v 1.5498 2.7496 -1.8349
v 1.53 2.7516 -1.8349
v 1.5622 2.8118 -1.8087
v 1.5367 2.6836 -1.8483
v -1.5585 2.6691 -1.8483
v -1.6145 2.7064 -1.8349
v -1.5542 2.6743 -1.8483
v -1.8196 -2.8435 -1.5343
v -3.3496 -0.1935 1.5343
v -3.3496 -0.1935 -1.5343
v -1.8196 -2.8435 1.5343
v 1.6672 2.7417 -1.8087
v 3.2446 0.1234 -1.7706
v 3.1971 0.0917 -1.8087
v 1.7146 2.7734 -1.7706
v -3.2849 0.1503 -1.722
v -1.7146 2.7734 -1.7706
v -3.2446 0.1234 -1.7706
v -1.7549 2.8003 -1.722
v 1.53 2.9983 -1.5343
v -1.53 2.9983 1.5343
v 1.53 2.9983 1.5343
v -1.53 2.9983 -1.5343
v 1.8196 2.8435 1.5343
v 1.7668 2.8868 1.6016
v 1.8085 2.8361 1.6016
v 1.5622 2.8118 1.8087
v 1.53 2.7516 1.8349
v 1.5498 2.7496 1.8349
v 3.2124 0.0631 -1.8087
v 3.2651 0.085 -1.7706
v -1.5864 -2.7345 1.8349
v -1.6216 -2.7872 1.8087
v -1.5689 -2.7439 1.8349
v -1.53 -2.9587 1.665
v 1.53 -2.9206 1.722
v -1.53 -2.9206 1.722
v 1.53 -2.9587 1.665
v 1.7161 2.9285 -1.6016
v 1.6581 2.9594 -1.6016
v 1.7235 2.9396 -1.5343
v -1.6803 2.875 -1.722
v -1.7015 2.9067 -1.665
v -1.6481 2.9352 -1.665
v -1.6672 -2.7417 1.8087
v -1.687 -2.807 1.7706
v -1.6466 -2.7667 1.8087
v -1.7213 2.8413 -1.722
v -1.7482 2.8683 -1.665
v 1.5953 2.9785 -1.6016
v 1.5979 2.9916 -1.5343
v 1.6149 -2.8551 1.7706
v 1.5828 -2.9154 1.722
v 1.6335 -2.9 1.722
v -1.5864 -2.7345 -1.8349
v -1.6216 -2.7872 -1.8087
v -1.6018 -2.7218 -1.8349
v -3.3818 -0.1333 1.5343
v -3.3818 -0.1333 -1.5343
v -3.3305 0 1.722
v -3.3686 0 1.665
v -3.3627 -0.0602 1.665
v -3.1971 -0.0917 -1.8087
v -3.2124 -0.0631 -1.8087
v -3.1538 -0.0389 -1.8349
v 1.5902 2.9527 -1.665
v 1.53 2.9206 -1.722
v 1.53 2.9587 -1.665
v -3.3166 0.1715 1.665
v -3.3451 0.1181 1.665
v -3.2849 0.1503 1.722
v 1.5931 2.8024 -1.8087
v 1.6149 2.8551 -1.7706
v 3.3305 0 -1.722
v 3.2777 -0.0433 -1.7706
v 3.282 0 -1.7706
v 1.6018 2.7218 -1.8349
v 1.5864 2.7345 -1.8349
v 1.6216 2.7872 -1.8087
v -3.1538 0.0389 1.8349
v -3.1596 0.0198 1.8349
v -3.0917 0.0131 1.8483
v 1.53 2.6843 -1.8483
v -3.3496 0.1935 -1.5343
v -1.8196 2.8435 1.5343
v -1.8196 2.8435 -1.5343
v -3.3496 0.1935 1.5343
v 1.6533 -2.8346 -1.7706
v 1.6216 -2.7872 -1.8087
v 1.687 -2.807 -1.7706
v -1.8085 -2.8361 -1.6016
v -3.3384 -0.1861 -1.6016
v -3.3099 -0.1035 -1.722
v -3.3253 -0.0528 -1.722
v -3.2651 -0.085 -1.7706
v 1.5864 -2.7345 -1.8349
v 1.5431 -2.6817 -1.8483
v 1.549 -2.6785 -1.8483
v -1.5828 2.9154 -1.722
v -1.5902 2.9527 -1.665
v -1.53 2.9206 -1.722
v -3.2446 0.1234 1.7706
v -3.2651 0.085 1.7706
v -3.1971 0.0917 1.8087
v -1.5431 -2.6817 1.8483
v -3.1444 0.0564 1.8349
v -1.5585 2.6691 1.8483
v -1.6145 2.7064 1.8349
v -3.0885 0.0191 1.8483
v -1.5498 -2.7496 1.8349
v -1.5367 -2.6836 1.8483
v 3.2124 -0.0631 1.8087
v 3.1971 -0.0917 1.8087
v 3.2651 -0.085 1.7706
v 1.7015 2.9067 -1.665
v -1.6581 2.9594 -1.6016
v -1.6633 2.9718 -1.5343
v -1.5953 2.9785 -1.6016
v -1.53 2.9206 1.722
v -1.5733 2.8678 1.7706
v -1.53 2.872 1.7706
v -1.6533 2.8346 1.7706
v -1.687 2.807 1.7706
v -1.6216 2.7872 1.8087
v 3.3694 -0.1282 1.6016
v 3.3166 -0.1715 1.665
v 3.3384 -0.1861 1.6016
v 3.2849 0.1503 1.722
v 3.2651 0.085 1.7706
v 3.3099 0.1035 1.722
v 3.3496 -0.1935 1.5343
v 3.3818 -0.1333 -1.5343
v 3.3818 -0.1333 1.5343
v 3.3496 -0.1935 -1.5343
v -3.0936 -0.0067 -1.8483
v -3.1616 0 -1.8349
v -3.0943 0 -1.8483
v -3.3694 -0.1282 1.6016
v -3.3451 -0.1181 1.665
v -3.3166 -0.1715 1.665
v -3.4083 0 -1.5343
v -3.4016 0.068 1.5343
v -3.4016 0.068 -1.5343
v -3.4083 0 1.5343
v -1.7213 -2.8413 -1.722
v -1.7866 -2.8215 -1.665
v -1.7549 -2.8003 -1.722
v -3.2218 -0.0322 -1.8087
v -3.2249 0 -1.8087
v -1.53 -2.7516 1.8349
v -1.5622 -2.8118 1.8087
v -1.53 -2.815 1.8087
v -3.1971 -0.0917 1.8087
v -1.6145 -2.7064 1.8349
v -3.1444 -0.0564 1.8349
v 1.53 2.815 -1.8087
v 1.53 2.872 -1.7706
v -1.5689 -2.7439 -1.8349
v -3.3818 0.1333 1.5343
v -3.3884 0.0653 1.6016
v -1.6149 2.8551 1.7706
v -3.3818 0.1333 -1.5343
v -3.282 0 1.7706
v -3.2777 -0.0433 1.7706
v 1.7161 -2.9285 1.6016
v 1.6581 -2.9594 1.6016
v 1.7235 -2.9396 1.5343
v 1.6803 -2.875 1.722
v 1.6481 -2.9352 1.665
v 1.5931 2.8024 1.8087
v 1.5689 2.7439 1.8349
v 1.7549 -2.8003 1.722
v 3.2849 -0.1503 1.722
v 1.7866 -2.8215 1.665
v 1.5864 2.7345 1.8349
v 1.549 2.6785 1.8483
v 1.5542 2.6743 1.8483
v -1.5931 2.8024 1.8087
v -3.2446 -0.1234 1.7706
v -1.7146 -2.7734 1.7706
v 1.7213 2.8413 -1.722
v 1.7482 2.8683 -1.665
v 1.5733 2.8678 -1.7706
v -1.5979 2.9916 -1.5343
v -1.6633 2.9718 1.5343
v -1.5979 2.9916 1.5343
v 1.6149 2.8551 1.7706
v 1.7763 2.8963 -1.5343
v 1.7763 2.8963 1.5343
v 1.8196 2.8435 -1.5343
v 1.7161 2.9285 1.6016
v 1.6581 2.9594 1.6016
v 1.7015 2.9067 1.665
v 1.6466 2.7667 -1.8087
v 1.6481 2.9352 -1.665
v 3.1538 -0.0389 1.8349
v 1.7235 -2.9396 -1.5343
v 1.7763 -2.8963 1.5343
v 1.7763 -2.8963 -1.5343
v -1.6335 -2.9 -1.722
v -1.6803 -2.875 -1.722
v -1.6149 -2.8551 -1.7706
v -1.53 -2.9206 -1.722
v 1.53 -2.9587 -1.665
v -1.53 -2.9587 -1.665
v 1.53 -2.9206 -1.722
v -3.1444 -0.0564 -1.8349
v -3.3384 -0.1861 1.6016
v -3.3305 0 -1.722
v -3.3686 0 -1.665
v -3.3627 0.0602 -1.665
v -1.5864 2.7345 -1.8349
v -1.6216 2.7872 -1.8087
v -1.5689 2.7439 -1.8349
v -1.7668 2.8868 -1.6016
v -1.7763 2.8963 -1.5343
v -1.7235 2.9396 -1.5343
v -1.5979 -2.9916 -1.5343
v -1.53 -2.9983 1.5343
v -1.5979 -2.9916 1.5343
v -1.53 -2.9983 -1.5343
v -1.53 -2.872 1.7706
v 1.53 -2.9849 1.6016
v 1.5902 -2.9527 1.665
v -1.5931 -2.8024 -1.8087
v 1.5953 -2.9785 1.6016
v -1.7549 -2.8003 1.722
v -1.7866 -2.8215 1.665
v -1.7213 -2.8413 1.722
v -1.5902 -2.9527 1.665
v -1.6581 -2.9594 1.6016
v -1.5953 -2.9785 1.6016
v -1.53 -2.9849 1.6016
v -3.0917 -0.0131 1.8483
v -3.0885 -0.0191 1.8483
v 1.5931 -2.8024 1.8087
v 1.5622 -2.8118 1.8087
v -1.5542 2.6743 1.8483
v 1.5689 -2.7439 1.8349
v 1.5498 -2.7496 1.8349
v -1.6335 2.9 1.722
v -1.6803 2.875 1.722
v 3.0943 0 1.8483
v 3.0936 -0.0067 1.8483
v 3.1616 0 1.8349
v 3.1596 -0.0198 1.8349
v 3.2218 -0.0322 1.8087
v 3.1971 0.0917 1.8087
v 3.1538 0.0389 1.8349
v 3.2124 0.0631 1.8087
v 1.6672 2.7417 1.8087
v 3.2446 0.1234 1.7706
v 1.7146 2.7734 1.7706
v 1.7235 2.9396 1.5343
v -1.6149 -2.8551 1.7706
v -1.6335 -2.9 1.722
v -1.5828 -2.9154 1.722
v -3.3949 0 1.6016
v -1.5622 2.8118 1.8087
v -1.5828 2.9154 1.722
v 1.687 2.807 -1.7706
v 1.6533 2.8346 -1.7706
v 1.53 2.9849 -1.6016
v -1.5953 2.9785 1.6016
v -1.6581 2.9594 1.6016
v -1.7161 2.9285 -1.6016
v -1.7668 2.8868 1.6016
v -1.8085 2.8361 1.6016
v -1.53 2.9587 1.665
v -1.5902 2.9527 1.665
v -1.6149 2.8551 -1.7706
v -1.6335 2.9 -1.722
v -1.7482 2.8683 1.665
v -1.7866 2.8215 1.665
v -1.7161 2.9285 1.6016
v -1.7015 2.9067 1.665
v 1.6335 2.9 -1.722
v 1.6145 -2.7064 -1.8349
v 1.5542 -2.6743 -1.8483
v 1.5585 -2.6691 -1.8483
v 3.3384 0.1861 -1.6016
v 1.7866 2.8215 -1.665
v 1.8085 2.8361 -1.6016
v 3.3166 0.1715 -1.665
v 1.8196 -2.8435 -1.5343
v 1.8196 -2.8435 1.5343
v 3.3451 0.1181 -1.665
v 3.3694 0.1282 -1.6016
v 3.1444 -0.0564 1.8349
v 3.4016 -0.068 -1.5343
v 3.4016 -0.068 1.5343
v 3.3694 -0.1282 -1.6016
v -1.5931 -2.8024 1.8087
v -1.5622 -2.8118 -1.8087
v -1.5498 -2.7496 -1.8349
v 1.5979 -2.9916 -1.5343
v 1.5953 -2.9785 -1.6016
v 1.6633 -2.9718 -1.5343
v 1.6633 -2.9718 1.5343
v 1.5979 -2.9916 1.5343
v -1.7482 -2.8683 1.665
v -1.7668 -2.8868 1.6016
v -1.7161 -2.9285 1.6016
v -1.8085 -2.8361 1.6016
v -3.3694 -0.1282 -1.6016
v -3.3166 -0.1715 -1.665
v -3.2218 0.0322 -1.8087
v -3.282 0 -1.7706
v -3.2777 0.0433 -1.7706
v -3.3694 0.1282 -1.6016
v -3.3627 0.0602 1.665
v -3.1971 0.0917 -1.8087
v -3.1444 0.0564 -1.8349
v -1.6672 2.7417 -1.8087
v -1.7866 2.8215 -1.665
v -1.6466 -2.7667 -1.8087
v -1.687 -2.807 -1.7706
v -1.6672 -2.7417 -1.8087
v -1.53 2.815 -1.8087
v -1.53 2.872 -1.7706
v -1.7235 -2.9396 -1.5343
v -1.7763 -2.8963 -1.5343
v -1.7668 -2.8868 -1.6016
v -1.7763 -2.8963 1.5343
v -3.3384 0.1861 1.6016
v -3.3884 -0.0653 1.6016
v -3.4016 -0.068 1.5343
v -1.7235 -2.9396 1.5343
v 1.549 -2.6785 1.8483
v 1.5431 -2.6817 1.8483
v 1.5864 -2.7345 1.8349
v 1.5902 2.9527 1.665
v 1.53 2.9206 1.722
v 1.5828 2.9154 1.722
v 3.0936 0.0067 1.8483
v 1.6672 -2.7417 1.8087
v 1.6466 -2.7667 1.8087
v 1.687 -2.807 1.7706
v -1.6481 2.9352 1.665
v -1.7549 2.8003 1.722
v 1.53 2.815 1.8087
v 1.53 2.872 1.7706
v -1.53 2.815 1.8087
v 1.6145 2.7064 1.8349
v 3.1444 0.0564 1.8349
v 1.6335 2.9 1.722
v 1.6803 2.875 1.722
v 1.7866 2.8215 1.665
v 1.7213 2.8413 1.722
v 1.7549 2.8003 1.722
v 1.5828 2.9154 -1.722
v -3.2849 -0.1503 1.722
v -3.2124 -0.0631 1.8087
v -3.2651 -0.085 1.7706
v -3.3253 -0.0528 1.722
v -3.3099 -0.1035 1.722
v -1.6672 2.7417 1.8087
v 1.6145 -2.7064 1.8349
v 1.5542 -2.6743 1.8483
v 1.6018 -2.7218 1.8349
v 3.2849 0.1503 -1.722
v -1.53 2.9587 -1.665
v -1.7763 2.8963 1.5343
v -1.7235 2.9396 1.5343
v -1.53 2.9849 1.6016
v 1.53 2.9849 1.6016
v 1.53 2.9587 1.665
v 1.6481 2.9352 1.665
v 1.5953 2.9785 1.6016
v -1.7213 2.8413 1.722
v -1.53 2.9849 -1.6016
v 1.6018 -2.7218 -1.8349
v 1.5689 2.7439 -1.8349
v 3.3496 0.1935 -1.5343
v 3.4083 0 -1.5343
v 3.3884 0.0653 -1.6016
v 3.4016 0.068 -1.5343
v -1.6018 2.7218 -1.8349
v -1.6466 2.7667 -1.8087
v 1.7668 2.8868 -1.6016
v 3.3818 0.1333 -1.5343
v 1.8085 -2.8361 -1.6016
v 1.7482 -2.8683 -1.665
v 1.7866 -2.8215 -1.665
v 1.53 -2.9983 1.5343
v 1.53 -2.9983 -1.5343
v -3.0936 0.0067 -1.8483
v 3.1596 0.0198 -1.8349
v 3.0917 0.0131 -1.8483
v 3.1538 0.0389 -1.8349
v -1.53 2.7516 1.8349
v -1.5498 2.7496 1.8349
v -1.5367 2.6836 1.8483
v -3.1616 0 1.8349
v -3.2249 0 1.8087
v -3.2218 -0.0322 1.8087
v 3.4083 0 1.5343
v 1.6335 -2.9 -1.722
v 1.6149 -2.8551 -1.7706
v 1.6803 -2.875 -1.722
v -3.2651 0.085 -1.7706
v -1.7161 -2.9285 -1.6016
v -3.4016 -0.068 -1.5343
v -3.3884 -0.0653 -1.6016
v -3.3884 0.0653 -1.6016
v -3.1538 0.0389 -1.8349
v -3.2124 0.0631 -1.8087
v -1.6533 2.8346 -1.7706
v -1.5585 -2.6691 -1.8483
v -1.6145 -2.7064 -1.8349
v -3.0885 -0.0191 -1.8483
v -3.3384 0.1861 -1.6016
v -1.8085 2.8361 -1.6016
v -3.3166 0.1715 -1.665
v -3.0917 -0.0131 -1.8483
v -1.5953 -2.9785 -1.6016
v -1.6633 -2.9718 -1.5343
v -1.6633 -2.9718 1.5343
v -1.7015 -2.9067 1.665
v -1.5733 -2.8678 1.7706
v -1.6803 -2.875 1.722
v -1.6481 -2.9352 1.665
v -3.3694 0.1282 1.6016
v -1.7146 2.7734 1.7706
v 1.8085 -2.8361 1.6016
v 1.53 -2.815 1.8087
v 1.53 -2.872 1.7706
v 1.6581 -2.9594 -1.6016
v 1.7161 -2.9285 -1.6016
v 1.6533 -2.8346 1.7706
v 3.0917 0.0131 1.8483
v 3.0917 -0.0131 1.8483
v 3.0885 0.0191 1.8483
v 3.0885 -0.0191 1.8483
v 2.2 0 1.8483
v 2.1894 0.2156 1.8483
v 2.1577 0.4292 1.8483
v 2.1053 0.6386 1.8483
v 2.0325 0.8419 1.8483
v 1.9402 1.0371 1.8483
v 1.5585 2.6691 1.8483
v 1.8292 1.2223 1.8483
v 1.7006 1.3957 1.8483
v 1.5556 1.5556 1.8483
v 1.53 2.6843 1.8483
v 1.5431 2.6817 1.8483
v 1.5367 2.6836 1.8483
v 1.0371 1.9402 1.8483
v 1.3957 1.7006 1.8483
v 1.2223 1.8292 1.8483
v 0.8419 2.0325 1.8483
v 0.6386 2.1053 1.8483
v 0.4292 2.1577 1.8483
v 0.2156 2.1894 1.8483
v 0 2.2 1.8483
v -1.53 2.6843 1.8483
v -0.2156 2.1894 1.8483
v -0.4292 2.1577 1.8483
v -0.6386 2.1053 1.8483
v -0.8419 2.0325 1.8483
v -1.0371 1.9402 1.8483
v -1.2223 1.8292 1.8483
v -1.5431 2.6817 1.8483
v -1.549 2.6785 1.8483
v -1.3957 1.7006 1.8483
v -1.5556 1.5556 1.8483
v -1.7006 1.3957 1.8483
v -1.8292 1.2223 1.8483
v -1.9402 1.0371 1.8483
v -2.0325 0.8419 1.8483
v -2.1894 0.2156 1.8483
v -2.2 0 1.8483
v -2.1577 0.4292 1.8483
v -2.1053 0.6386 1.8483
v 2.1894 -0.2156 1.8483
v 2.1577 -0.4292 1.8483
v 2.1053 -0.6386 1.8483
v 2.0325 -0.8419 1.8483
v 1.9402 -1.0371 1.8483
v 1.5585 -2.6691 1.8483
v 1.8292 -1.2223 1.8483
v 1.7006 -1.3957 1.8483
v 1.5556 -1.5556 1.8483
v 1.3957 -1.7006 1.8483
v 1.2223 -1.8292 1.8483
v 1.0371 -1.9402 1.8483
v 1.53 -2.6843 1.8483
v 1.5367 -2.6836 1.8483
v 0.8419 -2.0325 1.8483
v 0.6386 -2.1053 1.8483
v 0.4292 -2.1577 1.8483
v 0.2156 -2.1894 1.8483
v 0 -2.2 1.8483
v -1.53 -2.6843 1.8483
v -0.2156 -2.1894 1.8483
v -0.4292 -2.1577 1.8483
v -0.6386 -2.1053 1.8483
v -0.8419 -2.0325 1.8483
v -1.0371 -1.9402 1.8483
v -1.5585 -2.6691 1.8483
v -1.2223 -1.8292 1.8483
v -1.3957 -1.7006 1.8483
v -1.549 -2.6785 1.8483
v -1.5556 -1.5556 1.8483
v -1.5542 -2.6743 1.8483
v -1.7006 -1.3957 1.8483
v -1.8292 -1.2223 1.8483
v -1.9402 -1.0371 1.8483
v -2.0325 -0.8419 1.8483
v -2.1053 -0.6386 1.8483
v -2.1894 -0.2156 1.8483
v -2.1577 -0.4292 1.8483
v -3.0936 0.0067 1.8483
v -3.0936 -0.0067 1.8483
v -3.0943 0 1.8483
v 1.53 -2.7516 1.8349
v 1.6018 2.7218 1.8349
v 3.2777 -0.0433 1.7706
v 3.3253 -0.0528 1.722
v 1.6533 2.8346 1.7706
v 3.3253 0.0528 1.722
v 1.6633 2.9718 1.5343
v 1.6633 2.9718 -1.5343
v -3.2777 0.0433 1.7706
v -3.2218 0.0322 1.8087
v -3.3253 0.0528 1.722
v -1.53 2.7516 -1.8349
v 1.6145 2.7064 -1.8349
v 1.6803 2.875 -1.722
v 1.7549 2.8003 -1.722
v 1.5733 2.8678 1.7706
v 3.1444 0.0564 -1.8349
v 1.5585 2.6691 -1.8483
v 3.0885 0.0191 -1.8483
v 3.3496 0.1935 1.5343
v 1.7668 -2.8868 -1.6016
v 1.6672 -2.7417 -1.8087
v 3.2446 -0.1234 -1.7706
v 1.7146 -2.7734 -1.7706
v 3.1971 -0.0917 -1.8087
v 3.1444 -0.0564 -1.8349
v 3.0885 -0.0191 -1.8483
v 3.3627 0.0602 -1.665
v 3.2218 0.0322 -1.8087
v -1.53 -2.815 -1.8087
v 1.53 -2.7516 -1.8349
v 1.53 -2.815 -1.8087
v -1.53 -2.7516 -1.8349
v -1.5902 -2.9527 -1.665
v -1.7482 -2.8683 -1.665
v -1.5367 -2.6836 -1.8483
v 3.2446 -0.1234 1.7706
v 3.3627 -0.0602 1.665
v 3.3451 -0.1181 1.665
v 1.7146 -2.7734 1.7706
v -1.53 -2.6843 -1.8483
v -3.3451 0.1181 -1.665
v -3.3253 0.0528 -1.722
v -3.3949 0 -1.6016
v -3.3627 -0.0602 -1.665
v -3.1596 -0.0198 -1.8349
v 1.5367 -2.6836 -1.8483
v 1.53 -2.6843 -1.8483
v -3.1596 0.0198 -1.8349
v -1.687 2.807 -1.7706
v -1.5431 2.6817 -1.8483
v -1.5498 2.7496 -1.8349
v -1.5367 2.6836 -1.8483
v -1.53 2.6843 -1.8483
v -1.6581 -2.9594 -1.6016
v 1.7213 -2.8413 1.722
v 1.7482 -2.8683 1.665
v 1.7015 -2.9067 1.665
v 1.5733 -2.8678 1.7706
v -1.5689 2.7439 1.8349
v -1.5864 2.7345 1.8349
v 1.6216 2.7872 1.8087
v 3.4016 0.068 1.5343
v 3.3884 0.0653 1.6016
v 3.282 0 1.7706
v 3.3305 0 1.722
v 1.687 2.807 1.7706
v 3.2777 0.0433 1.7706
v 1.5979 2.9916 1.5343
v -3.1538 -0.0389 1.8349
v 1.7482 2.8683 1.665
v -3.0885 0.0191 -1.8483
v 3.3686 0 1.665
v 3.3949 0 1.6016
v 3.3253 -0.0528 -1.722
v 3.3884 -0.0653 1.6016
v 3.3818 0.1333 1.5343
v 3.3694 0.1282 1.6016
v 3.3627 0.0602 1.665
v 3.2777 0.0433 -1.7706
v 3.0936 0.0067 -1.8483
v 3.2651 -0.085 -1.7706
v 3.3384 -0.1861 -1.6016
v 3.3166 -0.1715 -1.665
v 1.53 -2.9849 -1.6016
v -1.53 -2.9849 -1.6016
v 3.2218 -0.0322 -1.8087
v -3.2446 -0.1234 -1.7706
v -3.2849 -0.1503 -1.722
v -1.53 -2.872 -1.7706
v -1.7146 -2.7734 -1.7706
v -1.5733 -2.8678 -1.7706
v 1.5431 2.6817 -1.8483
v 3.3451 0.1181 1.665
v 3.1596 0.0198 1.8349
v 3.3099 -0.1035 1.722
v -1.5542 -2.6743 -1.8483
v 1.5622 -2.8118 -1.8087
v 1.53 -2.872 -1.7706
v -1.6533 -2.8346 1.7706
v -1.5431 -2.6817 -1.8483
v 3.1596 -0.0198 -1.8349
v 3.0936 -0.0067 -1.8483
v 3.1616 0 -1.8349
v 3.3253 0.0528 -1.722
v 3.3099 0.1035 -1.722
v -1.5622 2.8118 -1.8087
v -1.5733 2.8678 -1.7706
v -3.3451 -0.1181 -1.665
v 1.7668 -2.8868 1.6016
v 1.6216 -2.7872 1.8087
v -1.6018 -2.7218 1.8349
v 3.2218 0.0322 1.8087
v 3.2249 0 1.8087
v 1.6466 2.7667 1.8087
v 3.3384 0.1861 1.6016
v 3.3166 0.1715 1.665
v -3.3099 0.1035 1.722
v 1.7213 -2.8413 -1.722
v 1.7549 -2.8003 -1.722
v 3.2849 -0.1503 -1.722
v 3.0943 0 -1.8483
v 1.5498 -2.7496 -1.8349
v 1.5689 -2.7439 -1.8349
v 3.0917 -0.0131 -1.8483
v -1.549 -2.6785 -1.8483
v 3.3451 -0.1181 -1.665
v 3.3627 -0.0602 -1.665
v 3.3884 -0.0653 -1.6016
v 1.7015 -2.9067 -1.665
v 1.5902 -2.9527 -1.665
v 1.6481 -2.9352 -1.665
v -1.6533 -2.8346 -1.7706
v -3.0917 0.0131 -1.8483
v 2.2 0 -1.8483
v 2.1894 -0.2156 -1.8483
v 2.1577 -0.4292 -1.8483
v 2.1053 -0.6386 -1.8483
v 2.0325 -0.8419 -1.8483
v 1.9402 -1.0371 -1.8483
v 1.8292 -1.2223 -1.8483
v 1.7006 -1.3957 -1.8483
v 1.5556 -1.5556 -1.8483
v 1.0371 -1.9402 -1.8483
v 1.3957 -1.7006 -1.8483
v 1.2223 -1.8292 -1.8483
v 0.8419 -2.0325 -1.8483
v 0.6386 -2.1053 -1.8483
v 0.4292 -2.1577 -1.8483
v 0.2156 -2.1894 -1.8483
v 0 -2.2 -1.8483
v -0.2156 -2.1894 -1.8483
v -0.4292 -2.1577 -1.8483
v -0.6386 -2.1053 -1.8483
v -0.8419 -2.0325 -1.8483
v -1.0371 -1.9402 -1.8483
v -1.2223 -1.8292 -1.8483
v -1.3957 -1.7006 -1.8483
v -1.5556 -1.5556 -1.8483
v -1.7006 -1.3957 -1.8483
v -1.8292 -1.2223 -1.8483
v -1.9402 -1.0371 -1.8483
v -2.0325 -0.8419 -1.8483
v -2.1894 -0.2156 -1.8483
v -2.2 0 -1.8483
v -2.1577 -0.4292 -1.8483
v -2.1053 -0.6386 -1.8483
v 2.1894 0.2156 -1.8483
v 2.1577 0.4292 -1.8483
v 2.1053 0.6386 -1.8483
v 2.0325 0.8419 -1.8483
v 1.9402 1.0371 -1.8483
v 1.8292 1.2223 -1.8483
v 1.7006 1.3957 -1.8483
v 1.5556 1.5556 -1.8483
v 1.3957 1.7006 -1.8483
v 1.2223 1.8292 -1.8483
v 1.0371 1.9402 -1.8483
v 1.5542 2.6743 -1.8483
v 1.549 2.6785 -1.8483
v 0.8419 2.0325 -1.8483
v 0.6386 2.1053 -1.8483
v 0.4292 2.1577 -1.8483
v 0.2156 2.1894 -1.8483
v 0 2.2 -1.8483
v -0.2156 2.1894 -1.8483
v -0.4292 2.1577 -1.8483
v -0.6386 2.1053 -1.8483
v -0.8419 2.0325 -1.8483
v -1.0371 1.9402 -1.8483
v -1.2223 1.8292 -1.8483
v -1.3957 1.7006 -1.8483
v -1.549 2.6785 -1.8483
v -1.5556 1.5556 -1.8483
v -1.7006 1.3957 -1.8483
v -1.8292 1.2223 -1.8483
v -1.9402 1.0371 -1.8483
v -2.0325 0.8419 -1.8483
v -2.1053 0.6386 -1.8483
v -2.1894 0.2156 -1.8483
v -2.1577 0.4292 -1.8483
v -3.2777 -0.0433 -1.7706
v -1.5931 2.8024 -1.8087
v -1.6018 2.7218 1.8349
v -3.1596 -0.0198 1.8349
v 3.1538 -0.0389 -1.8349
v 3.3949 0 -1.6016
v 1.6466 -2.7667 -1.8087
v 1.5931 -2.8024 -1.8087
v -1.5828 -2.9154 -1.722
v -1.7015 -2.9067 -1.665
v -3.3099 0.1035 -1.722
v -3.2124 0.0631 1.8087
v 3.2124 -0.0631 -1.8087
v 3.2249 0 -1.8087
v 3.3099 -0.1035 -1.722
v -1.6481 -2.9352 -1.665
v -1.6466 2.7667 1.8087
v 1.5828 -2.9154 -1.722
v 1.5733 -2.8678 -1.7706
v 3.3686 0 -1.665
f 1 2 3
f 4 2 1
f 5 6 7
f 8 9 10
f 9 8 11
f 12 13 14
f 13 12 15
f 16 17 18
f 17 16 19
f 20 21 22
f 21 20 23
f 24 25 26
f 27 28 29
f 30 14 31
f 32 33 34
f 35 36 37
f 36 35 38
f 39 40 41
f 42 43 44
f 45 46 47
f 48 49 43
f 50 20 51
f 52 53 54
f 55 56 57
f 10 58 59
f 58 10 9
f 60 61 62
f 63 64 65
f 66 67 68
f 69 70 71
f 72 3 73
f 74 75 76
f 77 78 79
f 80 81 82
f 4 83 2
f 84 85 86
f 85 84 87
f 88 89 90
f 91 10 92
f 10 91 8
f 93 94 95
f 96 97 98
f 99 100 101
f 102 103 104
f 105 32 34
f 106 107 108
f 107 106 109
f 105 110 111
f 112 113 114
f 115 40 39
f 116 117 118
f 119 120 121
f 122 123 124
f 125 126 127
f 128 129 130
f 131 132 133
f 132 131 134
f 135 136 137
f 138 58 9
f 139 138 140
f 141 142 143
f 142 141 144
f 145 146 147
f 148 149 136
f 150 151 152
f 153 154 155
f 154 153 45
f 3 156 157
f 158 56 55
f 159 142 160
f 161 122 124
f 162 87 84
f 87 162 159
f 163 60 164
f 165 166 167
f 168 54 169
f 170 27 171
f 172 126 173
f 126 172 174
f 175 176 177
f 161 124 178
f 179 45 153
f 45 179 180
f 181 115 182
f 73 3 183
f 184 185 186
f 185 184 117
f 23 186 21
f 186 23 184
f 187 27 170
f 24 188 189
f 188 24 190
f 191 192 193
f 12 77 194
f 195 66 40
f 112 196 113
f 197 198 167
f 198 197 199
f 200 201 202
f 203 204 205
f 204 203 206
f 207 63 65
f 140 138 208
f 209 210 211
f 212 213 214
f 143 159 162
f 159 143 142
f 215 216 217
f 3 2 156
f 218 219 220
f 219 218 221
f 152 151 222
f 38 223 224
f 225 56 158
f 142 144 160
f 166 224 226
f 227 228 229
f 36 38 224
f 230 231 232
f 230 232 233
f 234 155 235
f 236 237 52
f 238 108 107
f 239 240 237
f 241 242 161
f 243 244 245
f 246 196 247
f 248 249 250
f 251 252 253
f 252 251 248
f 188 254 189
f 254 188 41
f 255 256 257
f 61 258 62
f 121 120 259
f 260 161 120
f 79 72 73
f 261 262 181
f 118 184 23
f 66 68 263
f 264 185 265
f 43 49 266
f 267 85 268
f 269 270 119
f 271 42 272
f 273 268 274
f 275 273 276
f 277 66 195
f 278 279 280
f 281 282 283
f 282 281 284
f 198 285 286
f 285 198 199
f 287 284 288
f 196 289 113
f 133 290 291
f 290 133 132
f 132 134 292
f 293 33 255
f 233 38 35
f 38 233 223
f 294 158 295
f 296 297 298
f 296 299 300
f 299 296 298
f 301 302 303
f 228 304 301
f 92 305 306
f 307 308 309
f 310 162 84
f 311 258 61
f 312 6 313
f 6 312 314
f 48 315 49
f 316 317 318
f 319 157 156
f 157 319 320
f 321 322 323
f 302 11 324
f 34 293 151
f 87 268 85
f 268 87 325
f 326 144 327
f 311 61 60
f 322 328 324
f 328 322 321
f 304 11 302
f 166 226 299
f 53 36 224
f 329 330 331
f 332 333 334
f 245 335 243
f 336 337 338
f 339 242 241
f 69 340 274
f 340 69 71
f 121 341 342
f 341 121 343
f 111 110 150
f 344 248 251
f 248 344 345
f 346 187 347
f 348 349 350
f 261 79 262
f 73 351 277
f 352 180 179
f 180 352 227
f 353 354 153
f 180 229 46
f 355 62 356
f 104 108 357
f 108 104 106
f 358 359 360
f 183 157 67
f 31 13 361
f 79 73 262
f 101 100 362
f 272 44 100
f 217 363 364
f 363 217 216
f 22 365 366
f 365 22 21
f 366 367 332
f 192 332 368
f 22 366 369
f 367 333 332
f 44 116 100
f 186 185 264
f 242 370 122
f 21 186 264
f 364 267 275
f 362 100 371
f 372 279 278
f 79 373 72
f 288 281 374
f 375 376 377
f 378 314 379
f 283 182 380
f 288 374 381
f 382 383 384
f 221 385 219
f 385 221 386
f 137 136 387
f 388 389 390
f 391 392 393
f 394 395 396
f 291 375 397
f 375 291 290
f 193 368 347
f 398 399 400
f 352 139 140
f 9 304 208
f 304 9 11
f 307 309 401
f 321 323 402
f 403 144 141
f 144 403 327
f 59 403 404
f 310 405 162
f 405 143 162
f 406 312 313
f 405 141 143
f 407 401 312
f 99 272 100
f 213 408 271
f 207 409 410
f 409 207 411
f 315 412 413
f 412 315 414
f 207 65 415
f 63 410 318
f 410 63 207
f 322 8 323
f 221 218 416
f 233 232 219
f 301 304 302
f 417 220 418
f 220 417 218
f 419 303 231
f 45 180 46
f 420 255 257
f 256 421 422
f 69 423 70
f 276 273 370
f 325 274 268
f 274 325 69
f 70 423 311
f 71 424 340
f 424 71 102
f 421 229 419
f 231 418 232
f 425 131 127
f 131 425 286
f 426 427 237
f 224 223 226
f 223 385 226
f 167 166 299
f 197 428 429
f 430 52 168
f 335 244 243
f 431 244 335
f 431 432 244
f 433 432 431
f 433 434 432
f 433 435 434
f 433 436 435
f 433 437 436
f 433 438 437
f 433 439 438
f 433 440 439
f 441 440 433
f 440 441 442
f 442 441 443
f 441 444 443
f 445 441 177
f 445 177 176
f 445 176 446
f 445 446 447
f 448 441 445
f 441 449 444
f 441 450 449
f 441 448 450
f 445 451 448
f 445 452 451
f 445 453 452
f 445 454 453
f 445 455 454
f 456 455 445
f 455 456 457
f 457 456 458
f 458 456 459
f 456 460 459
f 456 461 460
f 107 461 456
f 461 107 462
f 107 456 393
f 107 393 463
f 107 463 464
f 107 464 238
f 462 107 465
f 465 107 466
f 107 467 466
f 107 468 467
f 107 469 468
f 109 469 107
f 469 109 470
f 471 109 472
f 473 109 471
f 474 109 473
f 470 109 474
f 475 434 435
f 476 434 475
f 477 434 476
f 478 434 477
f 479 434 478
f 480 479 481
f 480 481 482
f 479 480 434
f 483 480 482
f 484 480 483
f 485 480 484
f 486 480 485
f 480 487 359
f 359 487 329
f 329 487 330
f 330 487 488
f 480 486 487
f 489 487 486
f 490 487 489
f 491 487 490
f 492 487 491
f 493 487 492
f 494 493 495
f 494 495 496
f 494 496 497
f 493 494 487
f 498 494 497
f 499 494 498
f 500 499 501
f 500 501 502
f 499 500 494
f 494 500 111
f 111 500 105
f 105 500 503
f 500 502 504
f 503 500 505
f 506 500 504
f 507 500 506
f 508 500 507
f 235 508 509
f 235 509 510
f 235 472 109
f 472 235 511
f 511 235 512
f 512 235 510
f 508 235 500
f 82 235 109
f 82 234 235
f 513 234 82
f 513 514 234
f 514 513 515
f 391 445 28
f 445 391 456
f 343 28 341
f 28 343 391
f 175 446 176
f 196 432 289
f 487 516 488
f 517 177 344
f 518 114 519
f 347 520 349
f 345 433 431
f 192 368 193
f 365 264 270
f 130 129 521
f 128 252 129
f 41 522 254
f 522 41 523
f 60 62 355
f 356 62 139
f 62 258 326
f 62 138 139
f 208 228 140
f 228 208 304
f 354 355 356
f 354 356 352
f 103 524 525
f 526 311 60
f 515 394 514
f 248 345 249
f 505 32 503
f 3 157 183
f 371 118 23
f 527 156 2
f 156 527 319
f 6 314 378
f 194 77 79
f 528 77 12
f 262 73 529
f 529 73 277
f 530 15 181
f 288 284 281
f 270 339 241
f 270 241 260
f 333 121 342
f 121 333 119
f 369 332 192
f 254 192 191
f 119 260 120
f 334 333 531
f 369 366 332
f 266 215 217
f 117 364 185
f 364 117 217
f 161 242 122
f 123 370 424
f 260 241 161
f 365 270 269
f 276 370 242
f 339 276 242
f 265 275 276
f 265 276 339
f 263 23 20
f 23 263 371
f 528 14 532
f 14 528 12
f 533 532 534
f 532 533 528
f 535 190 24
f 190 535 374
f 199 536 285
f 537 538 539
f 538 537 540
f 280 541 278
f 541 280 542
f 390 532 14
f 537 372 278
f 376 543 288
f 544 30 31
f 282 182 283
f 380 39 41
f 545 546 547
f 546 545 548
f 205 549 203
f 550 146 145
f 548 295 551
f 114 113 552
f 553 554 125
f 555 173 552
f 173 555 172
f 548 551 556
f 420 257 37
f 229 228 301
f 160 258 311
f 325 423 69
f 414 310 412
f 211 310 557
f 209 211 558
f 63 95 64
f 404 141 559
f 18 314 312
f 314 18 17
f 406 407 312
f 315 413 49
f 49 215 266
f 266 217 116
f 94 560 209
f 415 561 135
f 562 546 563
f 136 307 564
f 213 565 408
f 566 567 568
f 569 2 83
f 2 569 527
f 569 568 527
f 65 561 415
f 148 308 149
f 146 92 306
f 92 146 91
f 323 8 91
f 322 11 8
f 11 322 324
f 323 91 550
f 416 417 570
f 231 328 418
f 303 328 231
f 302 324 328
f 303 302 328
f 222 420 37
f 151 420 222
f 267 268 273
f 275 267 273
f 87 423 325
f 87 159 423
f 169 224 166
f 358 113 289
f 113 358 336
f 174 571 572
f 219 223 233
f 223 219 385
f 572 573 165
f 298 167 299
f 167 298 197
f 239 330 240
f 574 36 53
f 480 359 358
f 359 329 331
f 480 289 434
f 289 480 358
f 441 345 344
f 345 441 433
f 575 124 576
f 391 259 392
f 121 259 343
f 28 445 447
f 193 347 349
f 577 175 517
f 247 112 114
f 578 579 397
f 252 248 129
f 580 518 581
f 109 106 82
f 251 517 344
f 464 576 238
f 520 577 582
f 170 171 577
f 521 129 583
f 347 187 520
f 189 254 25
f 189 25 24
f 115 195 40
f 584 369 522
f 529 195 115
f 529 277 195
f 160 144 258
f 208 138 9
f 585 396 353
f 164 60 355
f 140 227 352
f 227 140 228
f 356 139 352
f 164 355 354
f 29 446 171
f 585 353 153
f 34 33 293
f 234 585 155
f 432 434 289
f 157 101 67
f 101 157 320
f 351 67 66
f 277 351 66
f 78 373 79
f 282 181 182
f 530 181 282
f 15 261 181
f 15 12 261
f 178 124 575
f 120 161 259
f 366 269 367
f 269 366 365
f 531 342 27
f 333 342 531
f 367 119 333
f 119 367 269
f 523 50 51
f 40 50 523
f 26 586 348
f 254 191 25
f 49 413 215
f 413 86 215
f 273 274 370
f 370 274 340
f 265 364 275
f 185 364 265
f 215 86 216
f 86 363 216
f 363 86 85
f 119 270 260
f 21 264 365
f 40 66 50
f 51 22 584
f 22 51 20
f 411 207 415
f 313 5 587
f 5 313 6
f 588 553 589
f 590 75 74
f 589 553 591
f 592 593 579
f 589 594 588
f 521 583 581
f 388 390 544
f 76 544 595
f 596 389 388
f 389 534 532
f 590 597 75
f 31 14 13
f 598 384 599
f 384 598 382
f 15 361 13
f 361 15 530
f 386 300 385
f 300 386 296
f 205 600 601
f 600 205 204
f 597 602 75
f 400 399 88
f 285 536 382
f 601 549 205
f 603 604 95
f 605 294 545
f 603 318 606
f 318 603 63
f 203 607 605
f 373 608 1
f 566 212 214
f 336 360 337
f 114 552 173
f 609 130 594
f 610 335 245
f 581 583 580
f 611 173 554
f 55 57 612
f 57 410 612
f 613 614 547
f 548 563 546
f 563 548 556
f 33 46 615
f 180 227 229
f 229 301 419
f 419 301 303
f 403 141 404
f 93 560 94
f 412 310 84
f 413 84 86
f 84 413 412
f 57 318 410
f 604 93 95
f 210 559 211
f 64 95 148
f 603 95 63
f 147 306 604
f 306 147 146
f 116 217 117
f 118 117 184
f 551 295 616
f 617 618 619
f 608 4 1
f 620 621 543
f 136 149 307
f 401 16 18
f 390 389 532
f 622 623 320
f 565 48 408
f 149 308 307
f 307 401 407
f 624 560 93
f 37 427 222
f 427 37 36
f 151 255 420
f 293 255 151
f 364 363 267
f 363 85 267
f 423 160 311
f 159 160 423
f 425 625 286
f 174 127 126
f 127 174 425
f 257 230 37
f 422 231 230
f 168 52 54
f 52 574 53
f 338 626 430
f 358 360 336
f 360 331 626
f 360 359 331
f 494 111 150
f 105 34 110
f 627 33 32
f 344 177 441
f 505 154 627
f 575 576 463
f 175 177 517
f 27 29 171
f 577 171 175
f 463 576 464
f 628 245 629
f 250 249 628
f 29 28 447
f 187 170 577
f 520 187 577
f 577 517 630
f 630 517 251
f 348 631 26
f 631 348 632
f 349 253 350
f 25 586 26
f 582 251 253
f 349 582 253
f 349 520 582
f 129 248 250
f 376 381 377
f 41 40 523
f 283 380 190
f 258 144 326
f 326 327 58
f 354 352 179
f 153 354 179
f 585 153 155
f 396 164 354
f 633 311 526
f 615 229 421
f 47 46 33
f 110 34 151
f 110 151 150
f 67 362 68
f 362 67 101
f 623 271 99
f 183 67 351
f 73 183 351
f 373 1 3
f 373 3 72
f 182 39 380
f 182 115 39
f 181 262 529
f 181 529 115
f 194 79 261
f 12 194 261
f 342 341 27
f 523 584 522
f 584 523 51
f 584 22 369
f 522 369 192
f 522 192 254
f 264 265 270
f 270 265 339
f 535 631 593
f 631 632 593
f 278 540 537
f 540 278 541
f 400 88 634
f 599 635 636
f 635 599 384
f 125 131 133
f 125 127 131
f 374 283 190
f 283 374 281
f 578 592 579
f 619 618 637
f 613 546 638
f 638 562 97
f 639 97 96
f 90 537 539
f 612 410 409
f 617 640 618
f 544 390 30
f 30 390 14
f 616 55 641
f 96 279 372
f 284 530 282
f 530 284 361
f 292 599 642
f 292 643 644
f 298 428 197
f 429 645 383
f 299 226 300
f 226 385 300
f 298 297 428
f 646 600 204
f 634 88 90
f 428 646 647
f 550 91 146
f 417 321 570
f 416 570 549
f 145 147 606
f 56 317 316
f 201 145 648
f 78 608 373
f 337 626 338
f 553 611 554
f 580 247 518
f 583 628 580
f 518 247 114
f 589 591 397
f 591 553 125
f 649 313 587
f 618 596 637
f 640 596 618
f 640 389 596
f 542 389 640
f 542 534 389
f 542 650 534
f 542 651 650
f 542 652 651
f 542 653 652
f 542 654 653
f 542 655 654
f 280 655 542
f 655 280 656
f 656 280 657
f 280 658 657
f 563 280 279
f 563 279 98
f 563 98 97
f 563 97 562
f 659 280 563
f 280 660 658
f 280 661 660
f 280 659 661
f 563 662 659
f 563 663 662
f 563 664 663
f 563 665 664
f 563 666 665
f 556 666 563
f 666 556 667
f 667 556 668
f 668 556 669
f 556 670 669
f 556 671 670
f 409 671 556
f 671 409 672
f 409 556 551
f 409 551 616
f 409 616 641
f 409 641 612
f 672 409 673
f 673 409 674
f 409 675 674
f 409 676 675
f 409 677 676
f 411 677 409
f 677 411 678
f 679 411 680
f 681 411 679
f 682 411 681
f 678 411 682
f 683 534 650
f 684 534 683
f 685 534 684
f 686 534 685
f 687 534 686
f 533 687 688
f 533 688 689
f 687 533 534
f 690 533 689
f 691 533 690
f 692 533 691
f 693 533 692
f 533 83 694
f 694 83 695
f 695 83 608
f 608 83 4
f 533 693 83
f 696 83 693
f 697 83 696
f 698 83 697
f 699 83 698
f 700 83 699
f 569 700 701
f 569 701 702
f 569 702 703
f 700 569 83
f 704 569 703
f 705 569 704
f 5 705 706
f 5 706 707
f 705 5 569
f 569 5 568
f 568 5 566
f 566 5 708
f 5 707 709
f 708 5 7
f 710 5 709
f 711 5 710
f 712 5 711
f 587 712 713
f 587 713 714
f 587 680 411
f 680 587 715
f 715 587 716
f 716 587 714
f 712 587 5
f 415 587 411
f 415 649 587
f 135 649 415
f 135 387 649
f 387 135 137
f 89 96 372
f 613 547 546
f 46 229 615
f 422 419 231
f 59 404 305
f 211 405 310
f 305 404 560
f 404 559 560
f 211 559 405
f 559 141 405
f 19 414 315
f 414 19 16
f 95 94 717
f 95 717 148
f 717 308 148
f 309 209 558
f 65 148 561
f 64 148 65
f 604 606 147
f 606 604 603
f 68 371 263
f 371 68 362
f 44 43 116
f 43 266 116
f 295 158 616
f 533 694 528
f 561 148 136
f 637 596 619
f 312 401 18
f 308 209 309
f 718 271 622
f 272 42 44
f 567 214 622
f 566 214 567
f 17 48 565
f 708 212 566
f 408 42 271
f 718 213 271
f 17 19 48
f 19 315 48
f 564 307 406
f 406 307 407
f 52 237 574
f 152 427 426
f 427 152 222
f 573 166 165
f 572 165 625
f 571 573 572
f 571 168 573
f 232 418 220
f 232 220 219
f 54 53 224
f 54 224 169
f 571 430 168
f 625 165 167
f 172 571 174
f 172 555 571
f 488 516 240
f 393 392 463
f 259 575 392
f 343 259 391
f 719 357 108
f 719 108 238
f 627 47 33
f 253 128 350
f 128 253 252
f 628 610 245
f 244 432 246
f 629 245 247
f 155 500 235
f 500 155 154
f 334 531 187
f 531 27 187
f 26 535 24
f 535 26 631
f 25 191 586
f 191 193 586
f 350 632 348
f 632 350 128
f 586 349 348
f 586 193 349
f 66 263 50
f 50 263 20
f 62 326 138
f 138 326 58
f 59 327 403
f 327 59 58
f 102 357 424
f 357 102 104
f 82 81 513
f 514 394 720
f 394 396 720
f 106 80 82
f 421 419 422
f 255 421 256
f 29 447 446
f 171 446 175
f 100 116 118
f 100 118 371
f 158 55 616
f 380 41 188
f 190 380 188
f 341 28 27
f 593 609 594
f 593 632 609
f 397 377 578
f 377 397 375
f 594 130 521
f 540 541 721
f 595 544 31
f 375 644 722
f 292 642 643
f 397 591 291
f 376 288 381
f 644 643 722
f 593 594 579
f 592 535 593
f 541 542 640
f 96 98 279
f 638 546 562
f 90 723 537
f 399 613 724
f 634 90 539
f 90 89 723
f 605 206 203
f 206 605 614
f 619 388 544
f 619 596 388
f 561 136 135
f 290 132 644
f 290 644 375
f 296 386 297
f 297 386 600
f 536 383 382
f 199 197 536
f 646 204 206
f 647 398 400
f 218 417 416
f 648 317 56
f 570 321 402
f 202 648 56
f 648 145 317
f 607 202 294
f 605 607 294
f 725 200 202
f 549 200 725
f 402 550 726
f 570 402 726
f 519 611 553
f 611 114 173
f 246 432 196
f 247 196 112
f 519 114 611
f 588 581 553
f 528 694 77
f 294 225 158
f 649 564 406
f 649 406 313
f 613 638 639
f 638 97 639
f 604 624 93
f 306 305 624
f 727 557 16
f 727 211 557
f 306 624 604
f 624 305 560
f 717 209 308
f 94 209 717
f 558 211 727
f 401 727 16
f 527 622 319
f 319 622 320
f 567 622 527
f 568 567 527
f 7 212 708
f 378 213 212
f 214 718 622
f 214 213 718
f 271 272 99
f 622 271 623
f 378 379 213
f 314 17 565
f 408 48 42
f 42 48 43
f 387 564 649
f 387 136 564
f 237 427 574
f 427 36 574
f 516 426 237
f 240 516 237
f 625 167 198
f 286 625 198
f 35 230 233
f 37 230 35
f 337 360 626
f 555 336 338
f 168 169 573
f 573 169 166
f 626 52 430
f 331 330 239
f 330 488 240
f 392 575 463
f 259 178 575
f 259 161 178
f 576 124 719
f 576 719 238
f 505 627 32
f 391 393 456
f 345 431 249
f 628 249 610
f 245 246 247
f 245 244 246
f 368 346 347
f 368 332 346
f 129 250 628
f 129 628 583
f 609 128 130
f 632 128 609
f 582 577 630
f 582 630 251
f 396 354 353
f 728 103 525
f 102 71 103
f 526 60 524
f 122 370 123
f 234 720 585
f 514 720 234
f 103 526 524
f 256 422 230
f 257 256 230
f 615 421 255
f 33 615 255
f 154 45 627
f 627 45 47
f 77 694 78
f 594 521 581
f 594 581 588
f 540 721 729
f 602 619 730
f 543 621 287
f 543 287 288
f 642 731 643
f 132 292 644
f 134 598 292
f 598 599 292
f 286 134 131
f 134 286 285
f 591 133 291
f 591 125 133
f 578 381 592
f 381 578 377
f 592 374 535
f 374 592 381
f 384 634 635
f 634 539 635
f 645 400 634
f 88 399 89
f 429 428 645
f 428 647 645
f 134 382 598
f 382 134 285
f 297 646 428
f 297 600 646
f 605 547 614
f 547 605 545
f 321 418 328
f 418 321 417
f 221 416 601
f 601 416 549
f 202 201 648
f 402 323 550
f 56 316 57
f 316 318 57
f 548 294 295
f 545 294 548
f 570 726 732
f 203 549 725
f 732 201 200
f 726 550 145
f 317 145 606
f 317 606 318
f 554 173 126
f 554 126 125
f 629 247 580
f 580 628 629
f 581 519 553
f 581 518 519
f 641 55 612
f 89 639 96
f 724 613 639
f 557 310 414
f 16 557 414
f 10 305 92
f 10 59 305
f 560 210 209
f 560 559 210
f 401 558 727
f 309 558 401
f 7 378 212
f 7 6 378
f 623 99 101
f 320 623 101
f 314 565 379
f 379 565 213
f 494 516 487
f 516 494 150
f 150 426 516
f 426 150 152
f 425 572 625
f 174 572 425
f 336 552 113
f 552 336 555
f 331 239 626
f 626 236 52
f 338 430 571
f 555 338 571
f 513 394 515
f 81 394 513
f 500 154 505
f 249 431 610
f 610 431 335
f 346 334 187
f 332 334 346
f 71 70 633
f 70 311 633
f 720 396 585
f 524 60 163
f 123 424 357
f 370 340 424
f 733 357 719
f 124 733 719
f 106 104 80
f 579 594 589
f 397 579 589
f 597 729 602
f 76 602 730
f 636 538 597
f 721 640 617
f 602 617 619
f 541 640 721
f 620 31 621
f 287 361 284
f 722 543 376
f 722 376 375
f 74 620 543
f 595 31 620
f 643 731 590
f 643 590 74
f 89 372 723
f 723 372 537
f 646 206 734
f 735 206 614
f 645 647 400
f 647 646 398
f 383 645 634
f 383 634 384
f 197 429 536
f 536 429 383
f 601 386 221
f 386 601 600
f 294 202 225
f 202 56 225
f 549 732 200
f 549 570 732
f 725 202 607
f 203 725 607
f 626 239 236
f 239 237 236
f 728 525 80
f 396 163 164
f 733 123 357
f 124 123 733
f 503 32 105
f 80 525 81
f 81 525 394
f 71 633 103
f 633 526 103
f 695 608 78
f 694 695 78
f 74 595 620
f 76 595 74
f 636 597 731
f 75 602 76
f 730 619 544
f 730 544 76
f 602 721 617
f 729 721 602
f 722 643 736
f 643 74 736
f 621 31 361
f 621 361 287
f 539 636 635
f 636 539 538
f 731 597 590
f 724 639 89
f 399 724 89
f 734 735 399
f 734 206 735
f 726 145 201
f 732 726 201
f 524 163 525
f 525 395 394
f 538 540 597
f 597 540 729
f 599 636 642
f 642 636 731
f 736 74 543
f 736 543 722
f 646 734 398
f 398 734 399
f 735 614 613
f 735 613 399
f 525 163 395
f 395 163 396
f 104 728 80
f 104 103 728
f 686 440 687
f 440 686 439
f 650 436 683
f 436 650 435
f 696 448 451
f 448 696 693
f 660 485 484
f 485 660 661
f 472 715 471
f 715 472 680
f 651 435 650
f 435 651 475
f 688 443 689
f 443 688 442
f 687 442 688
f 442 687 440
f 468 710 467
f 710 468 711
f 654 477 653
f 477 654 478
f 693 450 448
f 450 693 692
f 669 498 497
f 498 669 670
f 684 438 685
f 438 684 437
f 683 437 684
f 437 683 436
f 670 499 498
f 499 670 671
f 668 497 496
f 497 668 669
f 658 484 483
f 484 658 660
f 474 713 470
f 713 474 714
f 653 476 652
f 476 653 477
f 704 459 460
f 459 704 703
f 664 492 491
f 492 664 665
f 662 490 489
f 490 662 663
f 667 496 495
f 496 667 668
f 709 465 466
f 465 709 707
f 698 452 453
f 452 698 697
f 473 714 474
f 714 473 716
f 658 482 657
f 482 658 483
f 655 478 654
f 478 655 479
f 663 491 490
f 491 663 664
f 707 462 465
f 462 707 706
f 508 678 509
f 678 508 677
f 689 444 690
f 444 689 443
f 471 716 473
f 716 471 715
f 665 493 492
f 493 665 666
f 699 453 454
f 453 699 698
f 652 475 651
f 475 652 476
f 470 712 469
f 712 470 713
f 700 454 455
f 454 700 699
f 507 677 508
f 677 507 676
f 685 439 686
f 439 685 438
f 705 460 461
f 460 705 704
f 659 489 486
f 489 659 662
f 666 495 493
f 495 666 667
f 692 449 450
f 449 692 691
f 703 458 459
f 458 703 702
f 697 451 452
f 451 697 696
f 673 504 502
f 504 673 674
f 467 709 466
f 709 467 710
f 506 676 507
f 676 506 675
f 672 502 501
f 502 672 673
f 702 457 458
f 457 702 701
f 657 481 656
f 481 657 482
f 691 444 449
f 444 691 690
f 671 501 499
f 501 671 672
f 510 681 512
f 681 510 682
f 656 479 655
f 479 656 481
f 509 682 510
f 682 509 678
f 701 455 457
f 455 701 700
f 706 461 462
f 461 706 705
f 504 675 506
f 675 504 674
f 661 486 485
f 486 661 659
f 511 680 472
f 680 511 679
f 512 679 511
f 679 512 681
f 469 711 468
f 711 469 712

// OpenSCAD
$fn=64;

screw_d = 4.0;
across_flats = 6.0;
thickness = 3.7;

clearance = 0.4;
hole_d = screw_d + clearance;

corner_chamfer = 0.35;

module hex_prism(af, h){
    r = af / sqrt(3);
    cylinder(h=h, r=r, $fn=6, center=true);
}

module chamfered_hex(af, h, c){
    if (c <= 0)
        hex_prism(af, h);
    else
        minkowski(){
            hex_prism(af - 2*c, h - 2*c);
            sphere(r=c, $fn=32);
        }
}

difference(){
    chamfered_hex(across_flats, thickness, corner_chamfer);
    cylinder(h=thickness + 2, d=hole_d, center=true, $fn=64);
}
